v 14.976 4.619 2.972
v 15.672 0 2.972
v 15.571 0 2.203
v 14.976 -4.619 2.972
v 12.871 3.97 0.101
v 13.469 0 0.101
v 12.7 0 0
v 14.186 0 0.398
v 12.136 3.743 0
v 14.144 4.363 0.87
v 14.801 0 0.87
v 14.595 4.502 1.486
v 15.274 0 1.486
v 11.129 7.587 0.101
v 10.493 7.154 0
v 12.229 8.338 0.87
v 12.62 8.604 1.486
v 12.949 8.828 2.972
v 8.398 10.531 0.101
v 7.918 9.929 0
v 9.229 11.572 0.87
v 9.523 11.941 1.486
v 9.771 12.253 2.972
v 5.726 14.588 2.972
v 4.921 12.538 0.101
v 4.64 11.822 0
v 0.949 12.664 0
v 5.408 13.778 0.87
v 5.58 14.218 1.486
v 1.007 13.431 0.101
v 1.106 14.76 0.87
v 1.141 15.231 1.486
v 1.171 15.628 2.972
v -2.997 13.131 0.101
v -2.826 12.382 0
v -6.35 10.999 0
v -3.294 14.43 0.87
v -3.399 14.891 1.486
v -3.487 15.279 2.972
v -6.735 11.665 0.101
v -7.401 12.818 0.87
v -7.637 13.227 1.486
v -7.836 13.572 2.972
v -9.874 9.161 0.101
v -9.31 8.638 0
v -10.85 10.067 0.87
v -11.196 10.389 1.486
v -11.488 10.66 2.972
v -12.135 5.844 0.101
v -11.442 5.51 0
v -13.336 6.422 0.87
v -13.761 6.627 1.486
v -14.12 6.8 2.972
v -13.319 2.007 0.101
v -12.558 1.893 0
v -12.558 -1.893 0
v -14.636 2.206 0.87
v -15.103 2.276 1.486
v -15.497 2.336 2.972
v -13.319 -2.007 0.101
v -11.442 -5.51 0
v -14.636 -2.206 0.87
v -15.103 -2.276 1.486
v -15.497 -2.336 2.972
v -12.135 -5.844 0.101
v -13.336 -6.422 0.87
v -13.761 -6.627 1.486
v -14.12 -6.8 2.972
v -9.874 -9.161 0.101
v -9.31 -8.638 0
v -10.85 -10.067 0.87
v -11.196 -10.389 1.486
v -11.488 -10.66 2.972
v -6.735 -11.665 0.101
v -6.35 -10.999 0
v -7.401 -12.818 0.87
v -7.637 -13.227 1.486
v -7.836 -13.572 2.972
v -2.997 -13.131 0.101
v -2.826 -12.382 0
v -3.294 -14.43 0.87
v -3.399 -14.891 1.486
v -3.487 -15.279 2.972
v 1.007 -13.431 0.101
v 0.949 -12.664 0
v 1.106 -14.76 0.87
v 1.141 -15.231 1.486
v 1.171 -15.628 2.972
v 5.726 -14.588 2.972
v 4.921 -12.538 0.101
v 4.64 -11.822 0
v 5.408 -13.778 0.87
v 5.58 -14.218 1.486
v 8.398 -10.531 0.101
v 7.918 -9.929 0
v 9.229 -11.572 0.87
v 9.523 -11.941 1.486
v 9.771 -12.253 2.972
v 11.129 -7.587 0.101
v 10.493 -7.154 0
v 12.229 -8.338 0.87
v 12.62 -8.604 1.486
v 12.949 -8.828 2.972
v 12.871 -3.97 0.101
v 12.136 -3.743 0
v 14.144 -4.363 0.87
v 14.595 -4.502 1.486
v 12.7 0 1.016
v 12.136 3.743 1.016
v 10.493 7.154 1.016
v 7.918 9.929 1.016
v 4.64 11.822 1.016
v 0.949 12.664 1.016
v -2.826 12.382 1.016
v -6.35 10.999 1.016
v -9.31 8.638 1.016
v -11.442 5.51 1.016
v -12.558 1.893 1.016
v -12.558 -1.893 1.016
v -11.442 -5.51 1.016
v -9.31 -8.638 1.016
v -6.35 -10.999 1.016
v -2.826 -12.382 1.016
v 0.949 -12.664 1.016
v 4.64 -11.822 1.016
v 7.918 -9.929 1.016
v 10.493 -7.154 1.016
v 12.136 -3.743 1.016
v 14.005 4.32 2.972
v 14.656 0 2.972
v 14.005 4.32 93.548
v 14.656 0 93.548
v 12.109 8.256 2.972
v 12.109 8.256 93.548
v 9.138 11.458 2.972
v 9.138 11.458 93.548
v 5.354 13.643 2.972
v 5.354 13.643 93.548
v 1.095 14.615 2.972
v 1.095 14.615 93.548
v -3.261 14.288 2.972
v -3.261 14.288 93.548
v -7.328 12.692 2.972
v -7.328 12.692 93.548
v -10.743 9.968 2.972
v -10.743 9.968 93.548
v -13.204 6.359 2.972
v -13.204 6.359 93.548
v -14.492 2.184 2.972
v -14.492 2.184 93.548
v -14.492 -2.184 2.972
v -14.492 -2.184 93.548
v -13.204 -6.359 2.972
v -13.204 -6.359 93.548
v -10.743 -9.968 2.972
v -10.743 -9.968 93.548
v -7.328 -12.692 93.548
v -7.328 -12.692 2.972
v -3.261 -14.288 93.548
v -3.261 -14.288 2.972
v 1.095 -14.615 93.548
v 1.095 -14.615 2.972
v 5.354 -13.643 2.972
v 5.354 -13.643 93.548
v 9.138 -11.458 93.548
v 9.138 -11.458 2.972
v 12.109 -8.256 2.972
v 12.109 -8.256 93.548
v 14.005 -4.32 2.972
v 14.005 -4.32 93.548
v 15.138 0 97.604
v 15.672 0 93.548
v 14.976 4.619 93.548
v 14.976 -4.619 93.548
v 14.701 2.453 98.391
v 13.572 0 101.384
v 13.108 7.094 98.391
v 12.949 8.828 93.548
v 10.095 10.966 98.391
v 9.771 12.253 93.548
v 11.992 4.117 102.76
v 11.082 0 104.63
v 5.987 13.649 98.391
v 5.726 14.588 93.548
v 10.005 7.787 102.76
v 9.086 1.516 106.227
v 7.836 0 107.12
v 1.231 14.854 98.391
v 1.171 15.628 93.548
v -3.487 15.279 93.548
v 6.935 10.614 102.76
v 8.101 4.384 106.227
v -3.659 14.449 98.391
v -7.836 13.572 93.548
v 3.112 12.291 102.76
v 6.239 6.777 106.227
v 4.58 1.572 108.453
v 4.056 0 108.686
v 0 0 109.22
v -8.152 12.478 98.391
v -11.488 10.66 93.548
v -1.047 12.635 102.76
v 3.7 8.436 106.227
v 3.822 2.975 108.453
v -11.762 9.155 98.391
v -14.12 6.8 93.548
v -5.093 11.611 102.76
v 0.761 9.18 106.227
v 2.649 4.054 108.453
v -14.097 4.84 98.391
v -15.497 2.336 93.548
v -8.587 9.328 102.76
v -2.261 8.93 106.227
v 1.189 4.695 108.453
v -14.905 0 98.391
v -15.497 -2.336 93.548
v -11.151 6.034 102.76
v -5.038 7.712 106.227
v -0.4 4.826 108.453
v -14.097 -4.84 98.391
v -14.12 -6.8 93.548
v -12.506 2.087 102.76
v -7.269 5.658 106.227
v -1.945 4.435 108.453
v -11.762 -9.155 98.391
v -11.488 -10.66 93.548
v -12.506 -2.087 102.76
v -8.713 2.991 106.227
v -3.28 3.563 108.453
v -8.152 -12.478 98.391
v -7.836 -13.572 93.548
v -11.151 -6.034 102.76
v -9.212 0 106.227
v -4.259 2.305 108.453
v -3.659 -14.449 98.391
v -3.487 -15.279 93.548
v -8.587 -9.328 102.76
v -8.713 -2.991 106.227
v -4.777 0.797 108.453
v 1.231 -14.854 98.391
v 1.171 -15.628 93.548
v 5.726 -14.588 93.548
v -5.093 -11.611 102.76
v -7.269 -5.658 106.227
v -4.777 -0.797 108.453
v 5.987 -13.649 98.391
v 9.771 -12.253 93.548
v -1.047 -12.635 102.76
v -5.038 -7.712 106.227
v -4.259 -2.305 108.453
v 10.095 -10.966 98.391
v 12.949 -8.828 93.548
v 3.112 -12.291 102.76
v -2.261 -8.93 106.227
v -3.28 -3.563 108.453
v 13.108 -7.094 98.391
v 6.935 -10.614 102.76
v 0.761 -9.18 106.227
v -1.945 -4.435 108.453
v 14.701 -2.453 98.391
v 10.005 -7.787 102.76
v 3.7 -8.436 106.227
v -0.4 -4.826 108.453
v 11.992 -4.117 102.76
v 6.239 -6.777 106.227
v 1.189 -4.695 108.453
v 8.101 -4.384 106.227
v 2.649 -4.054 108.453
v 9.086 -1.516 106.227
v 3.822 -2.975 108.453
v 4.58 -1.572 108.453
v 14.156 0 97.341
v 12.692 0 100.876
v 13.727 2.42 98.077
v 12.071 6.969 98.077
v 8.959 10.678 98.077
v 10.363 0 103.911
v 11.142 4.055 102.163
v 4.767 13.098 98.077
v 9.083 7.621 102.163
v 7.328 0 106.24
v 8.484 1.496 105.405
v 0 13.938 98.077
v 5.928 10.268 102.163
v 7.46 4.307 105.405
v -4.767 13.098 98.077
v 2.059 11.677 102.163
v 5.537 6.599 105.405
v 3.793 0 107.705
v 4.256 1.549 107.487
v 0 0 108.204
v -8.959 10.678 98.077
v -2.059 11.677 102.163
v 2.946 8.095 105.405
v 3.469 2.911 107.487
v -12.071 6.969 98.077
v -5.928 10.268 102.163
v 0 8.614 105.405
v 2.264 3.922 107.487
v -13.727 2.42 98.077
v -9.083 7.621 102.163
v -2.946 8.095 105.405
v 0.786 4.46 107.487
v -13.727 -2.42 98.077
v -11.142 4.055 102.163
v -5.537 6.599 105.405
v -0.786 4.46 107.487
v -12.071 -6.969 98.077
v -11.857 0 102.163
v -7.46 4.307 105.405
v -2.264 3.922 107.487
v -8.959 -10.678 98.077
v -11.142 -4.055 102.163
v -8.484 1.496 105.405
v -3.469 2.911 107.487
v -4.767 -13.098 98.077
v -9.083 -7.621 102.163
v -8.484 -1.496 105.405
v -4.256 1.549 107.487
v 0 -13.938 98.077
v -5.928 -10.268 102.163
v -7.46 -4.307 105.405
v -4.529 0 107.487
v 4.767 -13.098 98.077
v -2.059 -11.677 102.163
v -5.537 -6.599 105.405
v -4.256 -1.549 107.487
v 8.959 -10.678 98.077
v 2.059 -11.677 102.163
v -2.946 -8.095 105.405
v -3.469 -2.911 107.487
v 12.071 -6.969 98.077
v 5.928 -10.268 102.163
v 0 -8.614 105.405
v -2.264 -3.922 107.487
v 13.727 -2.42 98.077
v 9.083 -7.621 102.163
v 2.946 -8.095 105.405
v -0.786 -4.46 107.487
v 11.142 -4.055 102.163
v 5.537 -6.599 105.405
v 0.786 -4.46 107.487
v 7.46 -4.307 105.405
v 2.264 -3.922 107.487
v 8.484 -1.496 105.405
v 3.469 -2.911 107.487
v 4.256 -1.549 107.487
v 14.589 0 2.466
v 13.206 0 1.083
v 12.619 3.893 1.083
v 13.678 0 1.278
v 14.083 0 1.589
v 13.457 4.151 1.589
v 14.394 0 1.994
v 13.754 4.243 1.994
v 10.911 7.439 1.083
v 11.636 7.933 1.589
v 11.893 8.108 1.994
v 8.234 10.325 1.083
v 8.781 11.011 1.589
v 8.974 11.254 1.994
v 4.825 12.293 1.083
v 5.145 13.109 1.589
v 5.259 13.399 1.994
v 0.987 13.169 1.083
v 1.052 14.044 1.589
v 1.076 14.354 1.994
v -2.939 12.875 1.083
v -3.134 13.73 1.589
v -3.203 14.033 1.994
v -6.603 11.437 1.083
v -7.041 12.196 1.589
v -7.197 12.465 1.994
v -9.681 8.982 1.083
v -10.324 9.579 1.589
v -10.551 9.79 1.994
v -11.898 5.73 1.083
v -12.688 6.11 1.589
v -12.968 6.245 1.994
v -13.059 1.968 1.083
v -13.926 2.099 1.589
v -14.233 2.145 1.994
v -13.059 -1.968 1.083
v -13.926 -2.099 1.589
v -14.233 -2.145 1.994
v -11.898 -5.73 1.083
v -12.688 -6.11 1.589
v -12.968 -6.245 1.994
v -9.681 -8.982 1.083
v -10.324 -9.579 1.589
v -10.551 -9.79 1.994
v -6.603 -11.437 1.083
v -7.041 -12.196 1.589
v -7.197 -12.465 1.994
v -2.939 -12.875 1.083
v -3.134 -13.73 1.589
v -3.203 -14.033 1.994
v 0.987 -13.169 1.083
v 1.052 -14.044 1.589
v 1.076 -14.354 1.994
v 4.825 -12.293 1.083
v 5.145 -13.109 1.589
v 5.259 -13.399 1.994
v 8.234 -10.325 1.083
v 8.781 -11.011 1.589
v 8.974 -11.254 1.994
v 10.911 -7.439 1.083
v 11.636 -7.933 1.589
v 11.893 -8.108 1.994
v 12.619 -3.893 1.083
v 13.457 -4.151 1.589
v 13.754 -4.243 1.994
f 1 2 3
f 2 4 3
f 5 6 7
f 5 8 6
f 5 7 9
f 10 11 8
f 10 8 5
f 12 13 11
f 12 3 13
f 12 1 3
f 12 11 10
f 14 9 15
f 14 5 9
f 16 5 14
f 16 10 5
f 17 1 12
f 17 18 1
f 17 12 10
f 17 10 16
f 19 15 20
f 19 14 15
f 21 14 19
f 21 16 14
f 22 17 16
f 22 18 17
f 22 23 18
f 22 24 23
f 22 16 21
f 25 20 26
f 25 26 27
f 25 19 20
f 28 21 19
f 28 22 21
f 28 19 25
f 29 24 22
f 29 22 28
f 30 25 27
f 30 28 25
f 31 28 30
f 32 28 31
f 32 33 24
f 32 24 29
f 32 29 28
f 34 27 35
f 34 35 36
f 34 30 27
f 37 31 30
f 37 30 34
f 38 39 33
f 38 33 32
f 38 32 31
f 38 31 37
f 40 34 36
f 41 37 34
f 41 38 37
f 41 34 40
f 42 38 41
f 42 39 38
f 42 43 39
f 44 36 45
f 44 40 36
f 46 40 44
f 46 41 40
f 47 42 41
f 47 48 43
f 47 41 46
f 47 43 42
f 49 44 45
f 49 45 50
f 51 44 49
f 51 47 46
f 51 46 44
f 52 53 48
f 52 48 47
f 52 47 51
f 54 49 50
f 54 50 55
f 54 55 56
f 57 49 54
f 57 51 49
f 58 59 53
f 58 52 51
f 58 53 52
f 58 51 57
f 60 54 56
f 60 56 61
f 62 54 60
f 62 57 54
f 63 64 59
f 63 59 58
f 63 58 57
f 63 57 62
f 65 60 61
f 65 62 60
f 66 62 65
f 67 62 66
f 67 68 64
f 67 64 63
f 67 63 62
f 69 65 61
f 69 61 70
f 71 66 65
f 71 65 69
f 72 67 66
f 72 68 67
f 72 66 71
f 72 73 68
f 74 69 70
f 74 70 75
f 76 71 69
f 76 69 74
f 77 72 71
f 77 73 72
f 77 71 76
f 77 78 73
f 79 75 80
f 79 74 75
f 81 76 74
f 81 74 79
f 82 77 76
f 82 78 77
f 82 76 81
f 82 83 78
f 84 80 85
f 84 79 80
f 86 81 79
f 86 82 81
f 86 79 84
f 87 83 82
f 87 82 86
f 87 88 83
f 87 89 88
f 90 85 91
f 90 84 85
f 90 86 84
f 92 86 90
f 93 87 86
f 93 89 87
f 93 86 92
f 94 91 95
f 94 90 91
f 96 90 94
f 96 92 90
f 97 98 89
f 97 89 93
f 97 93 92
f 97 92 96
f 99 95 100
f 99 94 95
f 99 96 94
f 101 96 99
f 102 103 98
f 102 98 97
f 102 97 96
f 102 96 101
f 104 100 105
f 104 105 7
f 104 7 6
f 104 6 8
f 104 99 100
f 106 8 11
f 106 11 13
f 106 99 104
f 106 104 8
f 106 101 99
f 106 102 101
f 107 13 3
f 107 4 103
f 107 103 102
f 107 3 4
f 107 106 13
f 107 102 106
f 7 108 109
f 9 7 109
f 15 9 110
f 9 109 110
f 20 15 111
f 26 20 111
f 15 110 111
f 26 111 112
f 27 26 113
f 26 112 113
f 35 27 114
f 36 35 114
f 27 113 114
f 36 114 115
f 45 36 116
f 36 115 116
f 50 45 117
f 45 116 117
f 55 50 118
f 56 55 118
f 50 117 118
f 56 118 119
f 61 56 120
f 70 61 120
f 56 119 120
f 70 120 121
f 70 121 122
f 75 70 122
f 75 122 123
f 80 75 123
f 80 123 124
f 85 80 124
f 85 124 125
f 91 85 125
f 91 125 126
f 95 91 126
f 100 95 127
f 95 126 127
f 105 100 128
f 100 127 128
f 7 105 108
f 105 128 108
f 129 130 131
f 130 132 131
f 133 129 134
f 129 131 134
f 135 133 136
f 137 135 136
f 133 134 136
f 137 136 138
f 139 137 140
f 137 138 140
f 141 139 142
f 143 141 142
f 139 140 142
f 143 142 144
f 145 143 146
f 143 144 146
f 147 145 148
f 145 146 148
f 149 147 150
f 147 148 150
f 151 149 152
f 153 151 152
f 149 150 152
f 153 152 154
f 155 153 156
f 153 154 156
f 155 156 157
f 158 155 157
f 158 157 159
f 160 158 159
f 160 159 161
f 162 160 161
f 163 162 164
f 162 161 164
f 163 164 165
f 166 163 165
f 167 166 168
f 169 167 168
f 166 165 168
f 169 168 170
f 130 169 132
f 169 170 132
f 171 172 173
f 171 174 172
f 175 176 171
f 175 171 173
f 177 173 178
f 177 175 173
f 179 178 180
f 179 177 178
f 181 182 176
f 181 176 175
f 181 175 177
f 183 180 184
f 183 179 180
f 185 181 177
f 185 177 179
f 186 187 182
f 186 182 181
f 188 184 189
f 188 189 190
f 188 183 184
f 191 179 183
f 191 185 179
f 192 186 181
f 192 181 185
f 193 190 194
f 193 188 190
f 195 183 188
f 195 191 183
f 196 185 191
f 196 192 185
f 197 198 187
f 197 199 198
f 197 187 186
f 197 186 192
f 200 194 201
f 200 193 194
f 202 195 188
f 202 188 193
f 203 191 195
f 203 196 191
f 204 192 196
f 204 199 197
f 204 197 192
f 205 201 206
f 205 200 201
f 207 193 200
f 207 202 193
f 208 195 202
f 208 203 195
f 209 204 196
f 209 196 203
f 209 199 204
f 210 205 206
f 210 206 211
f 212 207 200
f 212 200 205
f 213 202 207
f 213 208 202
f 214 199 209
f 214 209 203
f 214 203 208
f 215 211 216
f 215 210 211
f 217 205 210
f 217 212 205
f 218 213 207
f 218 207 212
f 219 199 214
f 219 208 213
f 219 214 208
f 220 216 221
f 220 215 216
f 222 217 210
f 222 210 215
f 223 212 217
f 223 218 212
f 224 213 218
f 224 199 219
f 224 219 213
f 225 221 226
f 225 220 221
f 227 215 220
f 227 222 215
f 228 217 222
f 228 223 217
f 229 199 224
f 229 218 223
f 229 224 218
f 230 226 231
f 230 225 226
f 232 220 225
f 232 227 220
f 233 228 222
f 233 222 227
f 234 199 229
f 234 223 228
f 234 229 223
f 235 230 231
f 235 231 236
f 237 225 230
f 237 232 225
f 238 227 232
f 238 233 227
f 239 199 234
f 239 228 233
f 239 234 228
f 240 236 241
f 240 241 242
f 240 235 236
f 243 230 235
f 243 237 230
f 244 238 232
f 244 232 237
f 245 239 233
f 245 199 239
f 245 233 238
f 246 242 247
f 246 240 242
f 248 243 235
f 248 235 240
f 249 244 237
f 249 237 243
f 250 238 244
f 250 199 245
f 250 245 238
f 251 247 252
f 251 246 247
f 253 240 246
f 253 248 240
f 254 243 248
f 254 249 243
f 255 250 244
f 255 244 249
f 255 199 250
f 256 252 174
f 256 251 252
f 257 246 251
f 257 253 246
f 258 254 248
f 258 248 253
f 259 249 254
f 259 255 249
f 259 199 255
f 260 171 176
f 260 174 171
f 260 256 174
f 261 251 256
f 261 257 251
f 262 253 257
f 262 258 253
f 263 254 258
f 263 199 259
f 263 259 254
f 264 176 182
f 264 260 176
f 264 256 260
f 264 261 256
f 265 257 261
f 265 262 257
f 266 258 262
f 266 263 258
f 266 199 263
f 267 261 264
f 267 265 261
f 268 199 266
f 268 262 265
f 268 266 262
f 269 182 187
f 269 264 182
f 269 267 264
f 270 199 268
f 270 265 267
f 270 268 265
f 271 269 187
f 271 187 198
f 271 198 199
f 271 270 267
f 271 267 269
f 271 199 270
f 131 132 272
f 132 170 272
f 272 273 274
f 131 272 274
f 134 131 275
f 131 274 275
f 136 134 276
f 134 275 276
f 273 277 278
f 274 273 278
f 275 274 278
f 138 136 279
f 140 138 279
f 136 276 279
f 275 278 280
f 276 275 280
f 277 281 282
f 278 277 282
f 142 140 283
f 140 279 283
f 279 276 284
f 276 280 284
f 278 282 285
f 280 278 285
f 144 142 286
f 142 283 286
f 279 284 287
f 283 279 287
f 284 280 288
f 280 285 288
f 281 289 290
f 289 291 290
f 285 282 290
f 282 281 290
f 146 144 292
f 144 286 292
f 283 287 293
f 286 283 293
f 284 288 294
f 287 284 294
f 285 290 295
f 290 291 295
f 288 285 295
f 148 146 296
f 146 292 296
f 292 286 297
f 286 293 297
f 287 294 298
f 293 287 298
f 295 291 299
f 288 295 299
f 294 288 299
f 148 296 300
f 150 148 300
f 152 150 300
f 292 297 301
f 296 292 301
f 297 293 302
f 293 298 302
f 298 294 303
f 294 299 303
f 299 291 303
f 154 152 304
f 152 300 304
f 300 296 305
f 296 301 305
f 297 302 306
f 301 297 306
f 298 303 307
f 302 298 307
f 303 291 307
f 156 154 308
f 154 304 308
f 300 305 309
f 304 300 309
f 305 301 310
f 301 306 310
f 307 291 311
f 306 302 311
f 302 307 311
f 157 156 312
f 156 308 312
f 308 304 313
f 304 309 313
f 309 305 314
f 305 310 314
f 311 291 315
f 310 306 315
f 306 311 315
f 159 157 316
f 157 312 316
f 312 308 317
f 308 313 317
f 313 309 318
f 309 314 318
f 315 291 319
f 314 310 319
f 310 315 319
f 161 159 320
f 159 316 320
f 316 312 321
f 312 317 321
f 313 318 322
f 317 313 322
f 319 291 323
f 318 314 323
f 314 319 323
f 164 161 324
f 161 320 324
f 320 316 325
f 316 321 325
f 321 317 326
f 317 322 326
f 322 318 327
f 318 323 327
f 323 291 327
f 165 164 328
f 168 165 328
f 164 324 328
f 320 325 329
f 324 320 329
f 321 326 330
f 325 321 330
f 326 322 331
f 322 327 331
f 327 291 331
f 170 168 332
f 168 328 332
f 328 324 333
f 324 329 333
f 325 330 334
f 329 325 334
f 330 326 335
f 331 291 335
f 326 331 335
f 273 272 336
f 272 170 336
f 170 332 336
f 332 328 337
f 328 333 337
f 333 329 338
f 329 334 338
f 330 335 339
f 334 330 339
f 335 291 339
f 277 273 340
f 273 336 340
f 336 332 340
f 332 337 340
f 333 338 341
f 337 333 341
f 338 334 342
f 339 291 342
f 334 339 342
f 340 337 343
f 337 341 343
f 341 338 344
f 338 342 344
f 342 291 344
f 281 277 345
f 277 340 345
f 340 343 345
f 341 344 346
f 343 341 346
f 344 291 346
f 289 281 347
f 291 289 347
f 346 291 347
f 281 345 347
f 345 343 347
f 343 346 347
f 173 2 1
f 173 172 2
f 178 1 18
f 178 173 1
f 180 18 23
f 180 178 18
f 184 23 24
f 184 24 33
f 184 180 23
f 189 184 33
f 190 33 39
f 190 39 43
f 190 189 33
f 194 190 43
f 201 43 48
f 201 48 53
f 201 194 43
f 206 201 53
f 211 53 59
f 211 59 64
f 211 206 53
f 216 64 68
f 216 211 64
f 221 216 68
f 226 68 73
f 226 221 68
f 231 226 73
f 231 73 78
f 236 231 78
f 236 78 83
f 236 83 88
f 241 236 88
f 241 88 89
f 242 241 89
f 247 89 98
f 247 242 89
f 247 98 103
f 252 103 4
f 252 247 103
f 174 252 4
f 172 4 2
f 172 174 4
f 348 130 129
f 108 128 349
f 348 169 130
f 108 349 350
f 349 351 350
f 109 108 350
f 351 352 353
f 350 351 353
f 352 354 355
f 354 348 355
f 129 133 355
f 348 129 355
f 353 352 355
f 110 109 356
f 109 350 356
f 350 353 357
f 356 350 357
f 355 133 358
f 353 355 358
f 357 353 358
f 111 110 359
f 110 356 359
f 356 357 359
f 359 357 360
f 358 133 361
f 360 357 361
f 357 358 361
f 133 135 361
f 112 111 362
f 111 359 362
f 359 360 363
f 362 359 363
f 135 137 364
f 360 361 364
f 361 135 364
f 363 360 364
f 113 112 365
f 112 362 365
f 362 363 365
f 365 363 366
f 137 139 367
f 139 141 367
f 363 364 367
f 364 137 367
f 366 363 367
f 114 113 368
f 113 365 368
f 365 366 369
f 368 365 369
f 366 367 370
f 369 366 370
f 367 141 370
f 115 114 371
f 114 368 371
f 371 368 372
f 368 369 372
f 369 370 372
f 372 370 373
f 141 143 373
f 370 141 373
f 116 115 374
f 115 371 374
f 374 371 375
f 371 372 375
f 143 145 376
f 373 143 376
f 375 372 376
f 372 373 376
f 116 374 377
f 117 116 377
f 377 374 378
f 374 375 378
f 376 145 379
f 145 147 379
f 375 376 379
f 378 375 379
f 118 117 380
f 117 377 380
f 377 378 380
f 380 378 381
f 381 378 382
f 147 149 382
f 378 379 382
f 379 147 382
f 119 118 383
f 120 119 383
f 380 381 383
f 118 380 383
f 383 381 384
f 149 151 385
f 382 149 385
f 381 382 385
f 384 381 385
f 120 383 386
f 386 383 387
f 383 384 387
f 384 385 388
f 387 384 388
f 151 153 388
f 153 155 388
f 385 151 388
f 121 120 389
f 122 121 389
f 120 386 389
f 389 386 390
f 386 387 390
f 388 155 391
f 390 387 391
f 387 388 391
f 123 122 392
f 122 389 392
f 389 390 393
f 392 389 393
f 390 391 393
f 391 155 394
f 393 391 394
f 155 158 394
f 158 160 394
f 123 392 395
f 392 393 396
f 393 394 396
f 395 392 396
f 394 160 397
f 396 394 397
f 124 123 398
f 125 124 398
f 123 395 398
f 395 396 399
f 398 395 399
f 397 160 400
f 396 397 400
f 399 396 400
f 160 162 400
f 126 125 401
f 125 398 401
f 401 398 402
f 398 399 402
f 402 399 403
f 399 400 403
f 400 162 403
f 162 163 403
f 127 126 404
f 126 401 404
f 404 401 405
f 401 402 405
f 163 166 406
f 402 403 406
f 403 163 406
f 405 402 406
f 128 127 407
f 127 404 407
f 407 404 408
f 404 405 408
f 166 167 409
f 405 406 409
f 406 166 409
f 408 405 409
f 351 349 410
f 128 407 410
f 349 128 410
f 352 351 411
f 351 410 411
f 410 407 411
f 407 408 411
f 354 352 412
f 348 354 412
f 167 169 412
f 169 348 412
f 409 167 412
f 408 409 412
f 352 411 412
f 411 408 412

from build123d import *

# Parameters (mm, degrees)
F2_T = -1.016


# Not quite as in the source:
# - a shell that OpenCascade refuses in one call is made with other operations: the cavity is built on its own and cut out


with BuildPart() as f1:
    # F0 (on Front) → F1 (revolve)
    with BuildSketch(Plane.XZ):
        with BuildLine():
            Line((0, 109.22), (0, 0))
            Line((0, 0), (12.7, 0))
            ThreePointArc((12.7, 0), (14.8013799323, 0.8704200677), (15.6718, 2.9718))
            Line((15.6718, 2.9718), (15.6718, 93.5482))
            ThreePointArc((15.6718, 93.5482), (11.0816360534, 104.6298360534), (0, 109.22))
        make_face()
    revolve(axis=Axis((0, 0, 54.61), (0, 0, 1)))

    # F2: a shell. OpenCascade refuses it in one call, so the cavity is built on its own and cut out:
    # the body offset inwards by the wall thickness, plus a prism from it out through each open face.
    f2_core = offset(f1.part, amount=F2_T, mode=Mode.PRIVATE)
    f2_exits = [f2_core.faces().sort_by_distance(p)[0] for p in [
        (0, 0, 1.016),
    ]]
    add(f2_core, mode=Mode.SUBTRACT)
    extrude(f2_exits, amount=-F2_T, mode=Mode.SUBTRACT)


solid = f1.part
